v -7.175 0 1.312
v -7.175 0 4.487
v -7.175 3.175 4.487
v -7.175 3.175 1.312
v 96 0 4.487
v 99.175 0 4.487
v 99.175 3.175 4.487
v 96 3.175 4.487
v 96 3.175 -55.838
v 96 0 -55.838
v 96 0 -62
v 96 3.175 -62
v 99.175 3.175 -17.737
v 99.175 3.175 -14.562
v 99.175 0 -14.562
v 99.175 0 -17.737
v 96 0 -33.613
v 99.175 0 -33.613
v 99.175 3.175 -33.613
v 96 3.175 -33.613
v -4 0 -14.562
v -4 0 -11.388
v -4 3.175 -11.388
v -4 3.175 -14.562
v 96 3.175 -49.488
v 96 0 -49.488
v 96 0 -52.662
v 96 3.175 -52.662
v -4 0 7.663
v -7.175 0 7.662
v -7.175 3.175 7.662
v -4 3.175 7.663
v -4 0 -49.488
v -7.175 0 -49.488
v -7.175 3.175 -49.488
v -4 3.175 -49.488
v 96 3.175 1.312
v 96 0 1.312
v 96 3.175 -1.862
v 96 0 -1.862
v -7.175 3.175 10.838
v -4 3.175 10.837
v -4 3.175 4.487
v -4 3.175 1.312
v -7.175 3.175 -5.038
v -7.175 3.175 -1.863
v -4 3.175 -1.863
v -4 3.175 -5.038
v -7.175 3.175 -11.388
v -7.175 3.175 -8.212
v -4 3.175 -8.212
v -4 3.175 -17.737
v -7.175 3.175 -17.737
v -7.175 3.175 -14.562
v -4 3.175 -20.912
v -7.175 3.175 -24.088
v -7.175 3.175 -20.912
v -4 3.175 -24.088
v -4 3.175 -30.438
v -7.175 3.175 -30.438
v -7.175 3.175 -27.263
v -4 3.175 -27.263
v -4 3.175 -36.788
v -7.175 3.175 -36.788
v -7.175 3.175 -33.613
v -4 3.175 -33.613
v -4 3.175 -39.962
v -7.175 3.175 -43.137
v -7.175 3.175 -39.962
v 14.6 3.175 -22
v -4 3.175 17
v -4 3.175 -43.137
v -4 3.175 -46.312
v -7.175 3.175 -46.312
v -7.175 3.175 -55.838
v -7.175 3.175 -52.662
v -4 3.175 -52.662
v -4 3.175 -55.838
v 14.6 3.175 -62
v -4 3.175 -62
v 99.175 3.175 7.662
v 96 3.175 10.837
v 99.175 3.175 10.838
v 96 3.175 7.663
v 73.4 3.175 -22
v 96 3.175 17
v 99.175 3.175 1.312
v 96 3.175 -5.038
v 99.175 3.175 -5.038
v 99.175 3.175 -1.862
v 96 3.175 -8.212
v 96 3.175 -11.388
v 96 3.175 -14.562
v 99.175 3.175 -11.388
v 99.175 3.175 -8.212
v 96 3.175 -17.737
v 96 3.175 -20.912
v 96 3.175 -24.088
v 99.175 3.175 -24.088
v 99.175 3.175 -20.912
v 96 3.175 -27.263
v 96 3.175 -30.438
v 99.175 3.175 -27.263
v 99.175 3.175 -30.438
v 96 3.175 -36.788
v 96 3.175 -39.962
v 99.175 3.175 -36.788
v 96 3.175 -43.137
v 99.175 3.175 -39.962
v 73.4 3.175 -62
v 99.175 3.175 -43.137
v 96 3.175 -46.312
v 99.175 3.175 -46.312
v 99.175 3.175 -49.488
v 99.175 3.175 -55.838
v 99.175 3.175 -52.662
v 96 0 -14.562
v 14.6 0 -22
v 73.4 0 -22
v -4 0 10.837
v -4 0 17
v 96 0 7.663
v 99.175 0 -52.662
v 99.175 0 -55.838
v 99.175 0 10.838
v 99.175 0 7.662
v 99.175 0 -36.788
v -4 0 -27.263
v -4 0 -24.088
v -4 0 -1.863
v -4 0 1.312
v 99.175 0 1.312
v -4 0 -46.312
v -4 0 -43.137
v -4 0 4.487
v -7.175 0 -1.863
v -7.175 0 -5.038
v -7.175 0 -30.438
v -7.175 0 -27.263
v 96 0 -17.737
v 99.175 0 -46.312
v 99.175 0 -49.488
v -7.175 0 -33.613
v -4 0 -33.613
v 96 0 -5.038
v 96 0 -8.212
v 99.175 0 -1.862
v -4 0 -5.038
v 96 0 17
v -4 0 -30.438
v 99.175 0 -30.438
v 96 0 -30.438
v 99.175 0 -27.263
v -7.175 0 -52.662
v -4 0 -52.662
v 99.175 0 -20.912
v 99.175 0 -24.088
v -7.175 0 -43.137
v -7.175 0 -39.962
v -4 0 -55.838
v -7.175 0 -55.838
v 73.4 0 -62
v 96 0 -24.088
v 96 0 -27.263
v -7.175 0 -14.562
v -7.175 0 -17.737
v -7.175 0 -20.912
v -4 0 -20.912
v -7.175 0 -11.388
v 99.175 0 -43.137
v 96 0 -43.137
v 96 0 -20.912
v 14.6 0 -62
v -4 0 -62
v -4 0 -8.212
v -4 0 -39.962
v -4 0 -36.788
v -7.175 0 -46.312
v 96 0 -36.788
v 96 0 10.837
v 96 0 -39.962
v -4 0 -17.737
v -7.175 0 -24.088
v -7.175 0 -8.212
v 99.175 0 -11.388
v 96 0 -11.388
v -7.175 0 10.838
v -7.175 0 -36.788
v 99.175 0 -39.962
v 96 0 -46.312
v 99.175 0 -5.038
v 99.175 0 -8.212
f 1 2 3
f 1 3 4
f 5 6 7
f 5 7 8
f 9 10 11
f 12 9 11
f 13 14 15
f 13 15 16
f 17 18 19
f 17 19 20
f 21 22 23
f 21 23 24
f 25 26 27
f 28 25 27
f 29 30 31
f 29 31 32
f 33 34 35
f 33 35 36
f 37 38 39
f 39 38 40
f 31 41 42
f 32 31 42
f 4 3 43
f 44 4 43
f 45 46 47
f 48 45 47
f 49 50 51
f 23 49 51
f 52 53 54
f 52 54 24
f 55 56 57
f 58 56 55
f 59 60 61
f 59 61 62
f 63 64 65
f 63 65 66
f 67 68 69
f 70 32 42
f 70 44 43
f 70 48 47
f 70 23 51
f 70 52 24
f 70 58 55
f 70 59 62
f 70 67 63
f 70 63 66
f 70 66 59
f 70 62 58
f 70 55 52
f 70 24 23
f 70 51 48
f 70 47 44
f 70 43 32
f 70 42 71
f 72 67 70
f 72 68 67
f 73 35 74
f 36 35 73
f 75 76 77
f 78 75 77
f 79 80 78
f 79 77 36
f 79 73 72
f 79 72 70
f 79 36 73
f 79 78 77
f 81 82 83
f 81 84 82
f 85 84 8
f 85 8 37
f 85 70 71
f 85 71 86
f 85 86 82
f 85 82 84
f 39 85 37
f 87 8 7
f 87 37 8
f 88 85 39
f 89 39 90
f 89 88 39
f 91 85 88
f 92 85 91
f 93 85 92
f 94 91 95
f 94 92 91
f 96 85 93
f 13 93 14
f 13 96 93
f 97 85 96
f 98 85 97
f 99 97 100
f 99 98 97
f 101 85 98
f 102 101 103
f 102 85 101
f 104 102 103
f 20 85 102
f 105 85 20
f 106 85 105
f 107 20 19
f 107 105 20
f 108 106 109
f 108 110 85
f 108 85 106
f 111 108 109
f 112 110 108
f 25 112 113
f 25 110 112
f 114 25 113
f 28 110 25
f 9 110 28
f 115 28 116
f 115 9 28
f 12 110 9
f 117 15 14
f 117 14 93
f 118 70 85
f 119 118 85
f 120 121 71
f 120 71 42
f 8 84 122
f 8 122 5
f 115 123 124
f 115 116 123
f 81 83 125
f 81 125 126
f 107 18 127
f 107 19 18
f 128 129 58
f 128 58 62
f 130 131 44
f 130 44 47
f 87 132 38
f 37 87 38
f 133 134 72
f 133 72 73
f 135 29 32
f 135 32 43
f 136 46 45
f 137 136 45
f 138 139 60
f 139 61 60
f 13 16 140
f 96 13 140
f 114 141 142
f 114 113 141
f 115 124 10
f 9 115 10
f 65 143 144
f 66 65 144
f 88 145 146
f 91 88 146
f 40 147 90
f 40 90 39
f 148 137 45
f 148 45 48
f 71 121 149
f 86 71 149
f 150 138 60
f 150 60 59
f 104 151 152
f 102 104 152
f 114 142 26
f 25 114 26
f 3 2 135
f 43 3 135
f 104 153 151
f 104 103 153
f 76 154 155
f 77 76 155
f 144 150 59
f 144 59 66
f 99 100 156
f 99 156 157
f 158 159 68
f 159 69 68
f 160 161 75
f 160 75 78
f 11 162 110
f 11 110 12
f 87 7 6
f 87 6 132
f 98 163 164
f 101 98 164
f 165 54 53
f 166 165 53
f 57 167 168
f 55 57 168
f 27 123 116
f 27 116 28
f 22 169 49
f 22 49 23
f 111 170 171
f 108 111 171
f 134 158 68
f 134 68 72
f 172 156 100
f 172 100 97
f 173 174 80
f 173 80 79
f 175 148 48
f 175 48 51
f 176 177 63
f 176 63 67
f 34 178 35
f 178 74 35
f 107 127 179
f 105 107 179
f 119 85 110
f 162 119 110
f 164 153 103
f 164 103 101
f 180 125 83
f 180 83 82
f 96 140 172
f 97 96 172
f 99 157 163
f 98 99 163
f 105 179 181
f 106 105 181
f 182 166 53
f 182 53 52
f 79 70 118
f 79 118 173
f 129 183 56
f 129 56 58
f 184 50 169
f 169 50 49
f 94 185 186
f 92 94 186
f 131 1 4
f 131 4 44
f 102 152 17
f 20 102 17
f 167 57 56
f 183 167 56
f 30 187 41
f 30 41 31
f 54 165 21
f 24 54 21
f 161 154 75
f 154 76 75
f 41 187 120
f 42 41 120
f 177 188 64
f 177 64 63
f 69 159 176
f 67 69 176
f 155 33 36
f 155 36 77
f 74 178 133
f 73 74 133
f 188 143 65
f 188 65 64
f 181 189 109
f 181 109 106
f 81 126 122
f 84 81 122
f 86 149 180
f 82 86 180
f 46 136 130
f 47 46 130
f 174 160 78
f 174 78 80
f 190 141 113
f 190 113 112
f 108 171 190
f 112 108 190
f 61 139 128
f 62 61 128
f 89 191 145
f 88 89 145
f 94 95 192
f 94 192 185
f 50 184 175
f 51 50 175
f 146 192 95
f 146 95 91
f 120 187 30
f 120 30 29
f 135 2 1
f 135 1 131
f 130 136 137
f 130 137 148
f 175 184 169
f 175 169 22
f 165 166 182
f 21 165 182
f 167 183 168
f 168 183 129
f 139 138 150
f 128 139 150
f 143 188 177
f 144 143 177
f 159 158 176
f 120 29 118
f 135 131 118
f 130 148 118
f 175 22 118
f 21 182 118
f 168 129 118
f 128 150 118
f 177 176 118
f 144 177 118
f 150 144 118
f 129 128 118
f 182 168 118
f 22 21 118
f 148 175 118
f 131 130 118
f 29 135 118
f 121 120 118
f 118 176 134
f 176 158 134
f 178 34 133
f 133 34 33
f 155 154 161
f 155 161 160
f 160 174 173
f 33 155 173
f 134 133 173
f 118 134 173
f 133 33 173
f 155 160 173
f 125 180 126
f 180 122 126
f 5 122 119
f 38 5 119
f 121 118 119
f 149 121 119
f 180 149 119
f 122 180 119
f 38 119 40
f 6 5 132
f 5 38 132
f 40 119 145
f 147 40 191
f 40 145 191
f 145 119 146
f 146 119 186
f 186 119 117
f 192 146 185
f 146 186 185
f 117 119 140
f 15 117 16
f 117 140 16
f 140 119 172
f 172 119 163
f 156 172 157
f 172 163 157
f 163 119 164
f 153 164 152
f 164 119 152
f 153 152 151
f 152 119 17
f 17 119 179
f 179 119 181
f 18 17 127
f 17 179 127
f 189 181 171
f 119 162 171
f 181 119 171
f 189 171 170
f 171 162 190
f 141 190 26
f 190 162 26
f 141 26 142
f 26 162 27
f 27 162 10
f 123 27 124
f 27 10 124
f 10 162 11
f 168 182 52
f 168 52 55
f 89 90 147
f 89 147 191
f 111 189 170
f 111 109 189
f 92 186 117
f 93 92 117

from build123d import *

# Parameters (mm, degrees)
SKETCH3_W                     = 100
SKETCH3_H                     = 79
BOSS_EXTRUDE1_DEPTH           = 3.175
SKETCH5_W                     = 58.8
SKETCH5_H                     = 40
CUT_EXTRUDE2_DEPTH            = 3.175
SKETCH11_W                    = 6.35
SKETCH11_H                    = 3.175
BOSS_EXTRUDE2_DEPTH           = 3.175
LPATTERN2_COUNT               = 6
LPATTERN2_PITCH               = 6.35
LPATTERN2_COPY_1_SKETCH_W     = 6.35
LPATTERN2_COPY_1_SKETCH_H     = 3.175
LPATTERN2_COPY_1_DEPTH        = 3.175
LPATTERN2_COPY_2_SKETCH_W     = 6.35
LPATTERN2_COPY_2_SKETCH_H     = 3.175
LPATTERN2_COPY_2_DEPTH        = 3.175
LPATTERN2_COPY_3_SKETCH_W     = 6.35
LPATTERN2_COPY_3_SKETCH_H     = 3.175
LPATTERN2_COPY_3_DEPTH        = 3.175
LPATTERN2_COPY_4_SKETCH_W     = 6.35
LPATTERN2_COPY_4_SKETCH_H     = 3.175
LPATTERN2_COPY_4_DEPTH        = 3.175
LPATTERN2_COPY_5_SKETCH_W     = 6.35
LPATTERN2_COPY_5_SKETCH_H     = 3.175
LPATTERN2_COPY_5_DEPTH        = 3.175
LPATTERN2_COL_COUNT           = 6
LPATTERN2_COL_PITCH           = 6.35
LPATTERN2_COL_COPY_1_SKETCH_W = 6.35
LPATTERN2_COL_COPY_1_SKETCH_H = 3.175
LPATTERN2_COL_COPY_1_DEPTH    = 3.175
LPATTERN2_COL_COPY_2_SKETCH_W = 6.35
LPATTERN2_COL_COPY_2_SKETCH_H = 3.175
LPATTERN2_COL_COPY_2_DEPTH    = 3.175
LPATTERN2_COL_COPY_3_SKETCH_W = 6.35
LPATTERN2_COL_COPY_3_SKETCH_H = 3.175
LPATTERN2_COL_COPY_3_DEPTH    = 3.175
LPATTERN2_COL_COPY_4_SKETCH_W = 6.35
LPATTERN2_COL_COPY_4_SKETCH_H = 3.175
LPATTERN2_COL_COPY_4_DEPTH    = 3.175
LPATTERN2_COL_COPY_5_SKETCH_W = 6.35
LPATTERN2_COL_COPY_5_SKETCH_H = 3.175
LPATTERN2_COL_COPY_5_DEPTH    = 3.175
SKETCH13_W                    = 12.35
SKETCH13_H                    = 79
BOSS_EXTRUDE4_DEPTH           = 3.175
SKETCH14_W                    = 12.35
SKETCH14_H                    = 79
BOSS_EXTRUDE5_DEPTH           = 3.175
SKETCH15_R                    = 1.5
CUT_EXTRUDE4_DEPTH            = 10
SKETCH16_R                    = 1.5
CUT_EXTRUDE5_DEPTH            = 10
SKETCH17_W                    = 12.35
SKETCH17_H                    = 79
CUT_EXTRUDE6_DEPTH            = 10


with BuildPart() as part:
    # Sketch3 → Boss-Extrude1 (new body)
    with BuildSketch(Plane(origin=(0, 0, 0), x_dir=(1, 0, 0), z_dir=(0, 1, 0))):
        with Locations((46, 22.5)):
            Rectangle(SKETCH3_W, SKETCH3_H)
    extrude(amount=BOSS_EXTRUDE1_DEPTH)

    # Sketch5 → Cut-Extrude2 (cut)
    with BuildSketch(Plane(origin=(0, 3.175, 0), x_dir=(1, 0, 0), z_dir=(0, 1, 0))):
        with Locations((44, 42)):
            Rectangle(SKETCH5_W, SKETCH5_H)
    extrude(amount=-CUT_EXTRUDE2_DEPTH, mode=Mode.SUBTRACT)

    # Sketch11 → Boss-Extrude2 (add)
    with BuildSketch(Plane(origin=(0, 3.175, 0), x_dir=(1, 0, 0), z_dir=(0, 1, 0))):
        with Locations((-4, 22.5)):
            Rectangle(SKETCH11_W, SKETCH11_H)
    boss_extrude2 = extrude(amount=-BOSS_EXTRUDE2_DEPTH)

    # Mirror2: Boss-Extrude2 across plane
    add(boss_extrude2.mirror(Plane.ZY.offset(-46)))

    # LPattern2: Boss-Extrude2 ×6
    with Locations(*[(0, 0, -i * LPATTERN2_PITCH) for i in range(1, LPATTERN2_COUNT)]):
        add(boss_extrude2)

    # LPattern2 copy 1 sketch → LPattern2 copy 1 (add)
    with BuildSketch(Plane(origin=(92, 3.175, -6.35), x_dir=(-1, 0, 0), z_dir=(0, 1, 0))):
        with Locations((-4, -22.5)):
            Rectangle(LPATTERN2_COPY_1_SKETCH_W, LPATTERN2_COPY_1_SKETCH_H)
    extrude(amount=-LPATTERN2_COPY_1_DEPTH)

    # LPattern2 copy 2 sketch → LPattern2 copy 2 (add)
    with BuildSketch(Plane(origin=(92, 3.175, -12.7), x_dir=(-1, 0, 0), z_dir=(0, 1, 0))):
        with Locations((-4, -22.5)):
            Rectangle(LPATTERN2_COPY_2_SKETCH_W, LPATTERN2_COPY_2_SKETCH_H)
    extrude(amount=-LPATTERN2_COPY_2_DEPTH)

    # LPattern2 copy 3 sketch → LPattern2 copy 3 (add)
    with BuildSketch(Plane(origin=(92, 3.175, -19.05), x_dir=(-1, 0, 0), z_dir=(0, 1, 0))):
        with Locations((-4, -22.5)):
            Rectangle(LPATTERN2_COPY_3_SKETCH_W, LPATTERN2_COPY_3_SKETCH_H)
    extrude(amount=-LPATTERN2_COPY_3_DEPTH)

    # LPattern2 copy 4 sketch → LPattern2 copy 4 (add)
    with BuildSketch(Plane(origin=(92, 3.175, -25.4), x_dir=(-1, 0, 0), z_dir=(0, 1, 0))):
        with Locations((-4, -22.5)):
            Rectangle(LPATTERN2_COPY_4_SKETCH_W, LPATTERN2_COPY_4_SKETCH_H)
    extrude(amount=-LPATTERN2_COPY_4_DEPTH)

    # LPattern2 copy 5 sketch → LPattern2 copy 5 (add)
    with BuildSketch(Plane(origin=(92, 3.175, -31.75), x_dir=(-1, 0, 0), z_dir=(0, 1, 0))):
        with Locations((-4, -22.5)):
            Rectangle(LPATTERN2_COPY_5_SKETCH_W, LPATTERN2_COPY_5_SKETCH_H)
    extrude(amount=-LPATTERN2_COPY_5_DEPTH)

    # LPattern2 col: Boss-Extrude2 ×6
    with Locations(*[(0, 0, i * LPATTERN2_COL_PITCH) for i in range(1, LPATTERN2_COL_COUNT)]):
        add(boss_extrude2)

    # LPattern2 col copy 1 sketch → LPattern2 col copy 1 (add)
    with BuildSketch(Plane(origin=(92, 3.175, 6.35), x_dir=(-1, 0, 0), z_dir=(0, 1, 0))):
        with Locations((-4, -22.5)):
            Rectangle(LPATTERN2_COL_COPY_1_SKETCH_W, LPATTERN2_COL_COPY_1_SKETCH_H)
    extrude(amount=-LPATTERN2_COL_COPY_1_DEPTH)

    # LPattern2 col copy 2 sketch → LPattern2 col copy 2 (add)
    with BuildSketch(Plane(origin=(92, 3.175, 12.7), x_dir=(-1, 0, 0), z_dir=(0, 1, 0))):
        with Locations((-4, -22.5)):
            Rectangle(LPATTERN2_COL_COPY_2_SKETCH_W, LPATTERN2_COL_COPY_2_SKETCH_H)
    extrude(amount=-LPATTERN2_COL_COPY_2_DEPTH)

    # LPattern2 col copy 3 sketch → LPattern2 col copy 3 (add)
    with BuildSketch(Plane(origin=(92, 3.175, 19.05), x_dir=(-1, 0, 0), z_dir=(0, 1, 0))):
        with Locations((-4, -22.5)):
            Rectangle(LPATTERN2_COL_COPY_3_SKETCH_W, LPATTERN2_COL_COPY_3_SKETCH_H)
    extrude(amount=-LPATTERN2_COL_COPY_3_DEPTH)

    # LPattern2 col copy 4 sketch → LPattern2 col copy 4 (add)
    with BuildSketch(Plane(origin=(92, 3.175, 25.4), x_dir=(-1, 0, 0), z_dir=(0, 1, 0))):
        with Locations((-4, -22.5)):
            Rectangle(LPATTERN2_COL_COPY_4_SKETCH_W, LPATTERN2_COL_COPY_4_SKETCH_H)
    extrude(amount=-LPATTERN2_COL_COPY_4_DEPTH)

    # LPattern2 col copy 5 sketch → LPattern2 col copy 5 (add)
    with BuildSketch(Plane(origin=(92, 3.175, 31.75), x_dir=(-1, 0, 0), z_dir=(0, 1, 0))):
        with Locations((-4, -22.5)):
            Rectangle(LPATTERN2_COL_COPY_5_SKETCH_W, LPATTERN2_COL_COPY_5_SKETCH_H)
    extrude(amount=-LPATTERN2_COL_COPY_5_DEPTH)

    # Sketch13 → Boss-Extrude4 (add)
    with BuildSketch(Plane(origin=(0, 3.175, 0), x_dir=(1, 0, 0), z_dir=(0, 1, 0))):
        with Locations((-13.35, 22.5)):
            Rectangle(SKETCH13_W, SKETCH13_H)
    extrude(amount=-BOSS_EXTRUDE4_DEPTH)

    # Sketch14 → Boss-Extrude5 (add)
    with BuildSketch(Plane(origin=(0, 3.175, 0), x_dir=(1, 0, 0), z_dir=(0, 1, 0))):
        with Locations((105.35, 22.5)):
            Rectangle(SKETCH14_W, SKETCH14_H)
    extrude(amount=-BOSS_EXTRUDE5_DEPTH)

    # Sketch15 → Cut-Extrude4 (cut)
    with BuildSketch(Plane(origin=(0, 3.175, 0), x_dir=(1, 0, 0), z_dir=(0, 1, 0))):
        with Locations(Location((-13.35, 54, 0), (0, 0, 270))):
            Circle(SKETCH15_R)
        with Locations(Location((-13.35, -9, 0), (0, 0, 270))):
            Circle(SKETCH15_R)
    extrude(amount=-CUT_EXTRUDE4_DEPTH, mode=Mode.SUBTRACT)

    # Sketch16 → Cut-Extrude5 (cut)
    with BuildSketch(Plane(origin=(0, 3.175, 0), x_dir=(1, 0, 0), z_dir=(0, 1, 0))):
        with Locations(Location((105.35, 54, 0), (0, 0, 270))):
            Circle(SKETCH16_R)
        with Locations(Location((105.35, -9, 0), (0, 0, 270))):
            Circle(SKETCH16_R)
    extrude(amount=-CUT_EXTRUDE5_DEPTH, mode=Mode.SUBTRACT)

    # Sketch17 → Cut-Extrude6 (cut)
    with BuildSketch(Plane(origin=(0, 3.175, 0), x_dir=(1, 0, 0), z_dir=(0, 1, 0))):
        with Locations((-13.35, 22.5)):
            Rectangle(SKETCH17_W, SKETCH17_H)
        with Locations((105.35, 22.5)):
            Rectangle(SKETCH17_W, SKETCH17_H)
    extrude(amount=-CUT_EXTRUDE6_DEPTH, mode=Mode.SUBTRACT)


solid = part.part
